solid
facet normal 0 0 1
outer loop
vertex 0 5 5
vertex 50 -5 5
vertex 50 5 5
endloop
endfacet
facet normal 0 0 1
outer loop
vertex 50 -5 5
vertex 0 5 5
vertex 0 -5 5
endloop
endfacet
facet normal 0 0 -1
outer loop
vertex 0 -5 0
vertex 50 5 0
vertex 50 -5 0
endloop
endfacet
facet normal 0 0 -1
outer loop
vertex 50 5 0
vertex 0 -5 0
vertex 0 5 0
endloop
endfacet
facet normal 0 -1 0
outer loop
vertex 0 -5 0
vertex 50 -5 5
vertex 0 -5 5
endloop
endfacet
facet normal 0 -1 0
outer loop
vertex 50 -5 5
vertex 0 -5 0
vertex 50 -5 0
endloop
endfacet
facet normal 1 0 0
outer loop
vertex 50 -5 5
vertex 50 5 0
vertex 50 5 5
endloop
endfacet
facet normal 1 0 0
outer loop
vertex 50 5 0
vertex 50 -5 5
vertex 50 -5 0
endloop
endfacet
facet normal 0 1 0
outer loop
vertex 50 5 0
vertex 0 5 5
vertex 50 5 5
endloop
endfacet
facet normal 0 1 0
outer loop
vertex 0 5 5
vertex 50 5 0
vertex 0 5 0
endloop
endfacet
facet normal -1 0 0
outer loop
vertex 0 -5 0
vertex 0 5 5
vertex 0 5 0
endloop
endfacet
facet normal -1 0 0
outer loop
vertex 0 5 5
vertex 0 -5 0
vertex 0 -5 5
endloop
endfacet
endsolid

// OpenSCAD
// file: Library/center.scad
module center(axis){
	translate((axis / -2.0)){
		children();
	}
}
// main file
use <Library/center.scad>

//Length, width, height. Length is gonna be the rail length, which is the spring length plus the paddle thiccness.
dimensions = [50, 10, 5];
module CylinderDispenser_Rail_Wall(dimensions){
	//The walls still "grow" forwards, but it's the parent module's job to translate/rotate/mirror it
	center([0, dimensions[1], 0]){
		cube(dimensions);
	}
}
CylinderDispenser_Rail_Wall(dimensions);
